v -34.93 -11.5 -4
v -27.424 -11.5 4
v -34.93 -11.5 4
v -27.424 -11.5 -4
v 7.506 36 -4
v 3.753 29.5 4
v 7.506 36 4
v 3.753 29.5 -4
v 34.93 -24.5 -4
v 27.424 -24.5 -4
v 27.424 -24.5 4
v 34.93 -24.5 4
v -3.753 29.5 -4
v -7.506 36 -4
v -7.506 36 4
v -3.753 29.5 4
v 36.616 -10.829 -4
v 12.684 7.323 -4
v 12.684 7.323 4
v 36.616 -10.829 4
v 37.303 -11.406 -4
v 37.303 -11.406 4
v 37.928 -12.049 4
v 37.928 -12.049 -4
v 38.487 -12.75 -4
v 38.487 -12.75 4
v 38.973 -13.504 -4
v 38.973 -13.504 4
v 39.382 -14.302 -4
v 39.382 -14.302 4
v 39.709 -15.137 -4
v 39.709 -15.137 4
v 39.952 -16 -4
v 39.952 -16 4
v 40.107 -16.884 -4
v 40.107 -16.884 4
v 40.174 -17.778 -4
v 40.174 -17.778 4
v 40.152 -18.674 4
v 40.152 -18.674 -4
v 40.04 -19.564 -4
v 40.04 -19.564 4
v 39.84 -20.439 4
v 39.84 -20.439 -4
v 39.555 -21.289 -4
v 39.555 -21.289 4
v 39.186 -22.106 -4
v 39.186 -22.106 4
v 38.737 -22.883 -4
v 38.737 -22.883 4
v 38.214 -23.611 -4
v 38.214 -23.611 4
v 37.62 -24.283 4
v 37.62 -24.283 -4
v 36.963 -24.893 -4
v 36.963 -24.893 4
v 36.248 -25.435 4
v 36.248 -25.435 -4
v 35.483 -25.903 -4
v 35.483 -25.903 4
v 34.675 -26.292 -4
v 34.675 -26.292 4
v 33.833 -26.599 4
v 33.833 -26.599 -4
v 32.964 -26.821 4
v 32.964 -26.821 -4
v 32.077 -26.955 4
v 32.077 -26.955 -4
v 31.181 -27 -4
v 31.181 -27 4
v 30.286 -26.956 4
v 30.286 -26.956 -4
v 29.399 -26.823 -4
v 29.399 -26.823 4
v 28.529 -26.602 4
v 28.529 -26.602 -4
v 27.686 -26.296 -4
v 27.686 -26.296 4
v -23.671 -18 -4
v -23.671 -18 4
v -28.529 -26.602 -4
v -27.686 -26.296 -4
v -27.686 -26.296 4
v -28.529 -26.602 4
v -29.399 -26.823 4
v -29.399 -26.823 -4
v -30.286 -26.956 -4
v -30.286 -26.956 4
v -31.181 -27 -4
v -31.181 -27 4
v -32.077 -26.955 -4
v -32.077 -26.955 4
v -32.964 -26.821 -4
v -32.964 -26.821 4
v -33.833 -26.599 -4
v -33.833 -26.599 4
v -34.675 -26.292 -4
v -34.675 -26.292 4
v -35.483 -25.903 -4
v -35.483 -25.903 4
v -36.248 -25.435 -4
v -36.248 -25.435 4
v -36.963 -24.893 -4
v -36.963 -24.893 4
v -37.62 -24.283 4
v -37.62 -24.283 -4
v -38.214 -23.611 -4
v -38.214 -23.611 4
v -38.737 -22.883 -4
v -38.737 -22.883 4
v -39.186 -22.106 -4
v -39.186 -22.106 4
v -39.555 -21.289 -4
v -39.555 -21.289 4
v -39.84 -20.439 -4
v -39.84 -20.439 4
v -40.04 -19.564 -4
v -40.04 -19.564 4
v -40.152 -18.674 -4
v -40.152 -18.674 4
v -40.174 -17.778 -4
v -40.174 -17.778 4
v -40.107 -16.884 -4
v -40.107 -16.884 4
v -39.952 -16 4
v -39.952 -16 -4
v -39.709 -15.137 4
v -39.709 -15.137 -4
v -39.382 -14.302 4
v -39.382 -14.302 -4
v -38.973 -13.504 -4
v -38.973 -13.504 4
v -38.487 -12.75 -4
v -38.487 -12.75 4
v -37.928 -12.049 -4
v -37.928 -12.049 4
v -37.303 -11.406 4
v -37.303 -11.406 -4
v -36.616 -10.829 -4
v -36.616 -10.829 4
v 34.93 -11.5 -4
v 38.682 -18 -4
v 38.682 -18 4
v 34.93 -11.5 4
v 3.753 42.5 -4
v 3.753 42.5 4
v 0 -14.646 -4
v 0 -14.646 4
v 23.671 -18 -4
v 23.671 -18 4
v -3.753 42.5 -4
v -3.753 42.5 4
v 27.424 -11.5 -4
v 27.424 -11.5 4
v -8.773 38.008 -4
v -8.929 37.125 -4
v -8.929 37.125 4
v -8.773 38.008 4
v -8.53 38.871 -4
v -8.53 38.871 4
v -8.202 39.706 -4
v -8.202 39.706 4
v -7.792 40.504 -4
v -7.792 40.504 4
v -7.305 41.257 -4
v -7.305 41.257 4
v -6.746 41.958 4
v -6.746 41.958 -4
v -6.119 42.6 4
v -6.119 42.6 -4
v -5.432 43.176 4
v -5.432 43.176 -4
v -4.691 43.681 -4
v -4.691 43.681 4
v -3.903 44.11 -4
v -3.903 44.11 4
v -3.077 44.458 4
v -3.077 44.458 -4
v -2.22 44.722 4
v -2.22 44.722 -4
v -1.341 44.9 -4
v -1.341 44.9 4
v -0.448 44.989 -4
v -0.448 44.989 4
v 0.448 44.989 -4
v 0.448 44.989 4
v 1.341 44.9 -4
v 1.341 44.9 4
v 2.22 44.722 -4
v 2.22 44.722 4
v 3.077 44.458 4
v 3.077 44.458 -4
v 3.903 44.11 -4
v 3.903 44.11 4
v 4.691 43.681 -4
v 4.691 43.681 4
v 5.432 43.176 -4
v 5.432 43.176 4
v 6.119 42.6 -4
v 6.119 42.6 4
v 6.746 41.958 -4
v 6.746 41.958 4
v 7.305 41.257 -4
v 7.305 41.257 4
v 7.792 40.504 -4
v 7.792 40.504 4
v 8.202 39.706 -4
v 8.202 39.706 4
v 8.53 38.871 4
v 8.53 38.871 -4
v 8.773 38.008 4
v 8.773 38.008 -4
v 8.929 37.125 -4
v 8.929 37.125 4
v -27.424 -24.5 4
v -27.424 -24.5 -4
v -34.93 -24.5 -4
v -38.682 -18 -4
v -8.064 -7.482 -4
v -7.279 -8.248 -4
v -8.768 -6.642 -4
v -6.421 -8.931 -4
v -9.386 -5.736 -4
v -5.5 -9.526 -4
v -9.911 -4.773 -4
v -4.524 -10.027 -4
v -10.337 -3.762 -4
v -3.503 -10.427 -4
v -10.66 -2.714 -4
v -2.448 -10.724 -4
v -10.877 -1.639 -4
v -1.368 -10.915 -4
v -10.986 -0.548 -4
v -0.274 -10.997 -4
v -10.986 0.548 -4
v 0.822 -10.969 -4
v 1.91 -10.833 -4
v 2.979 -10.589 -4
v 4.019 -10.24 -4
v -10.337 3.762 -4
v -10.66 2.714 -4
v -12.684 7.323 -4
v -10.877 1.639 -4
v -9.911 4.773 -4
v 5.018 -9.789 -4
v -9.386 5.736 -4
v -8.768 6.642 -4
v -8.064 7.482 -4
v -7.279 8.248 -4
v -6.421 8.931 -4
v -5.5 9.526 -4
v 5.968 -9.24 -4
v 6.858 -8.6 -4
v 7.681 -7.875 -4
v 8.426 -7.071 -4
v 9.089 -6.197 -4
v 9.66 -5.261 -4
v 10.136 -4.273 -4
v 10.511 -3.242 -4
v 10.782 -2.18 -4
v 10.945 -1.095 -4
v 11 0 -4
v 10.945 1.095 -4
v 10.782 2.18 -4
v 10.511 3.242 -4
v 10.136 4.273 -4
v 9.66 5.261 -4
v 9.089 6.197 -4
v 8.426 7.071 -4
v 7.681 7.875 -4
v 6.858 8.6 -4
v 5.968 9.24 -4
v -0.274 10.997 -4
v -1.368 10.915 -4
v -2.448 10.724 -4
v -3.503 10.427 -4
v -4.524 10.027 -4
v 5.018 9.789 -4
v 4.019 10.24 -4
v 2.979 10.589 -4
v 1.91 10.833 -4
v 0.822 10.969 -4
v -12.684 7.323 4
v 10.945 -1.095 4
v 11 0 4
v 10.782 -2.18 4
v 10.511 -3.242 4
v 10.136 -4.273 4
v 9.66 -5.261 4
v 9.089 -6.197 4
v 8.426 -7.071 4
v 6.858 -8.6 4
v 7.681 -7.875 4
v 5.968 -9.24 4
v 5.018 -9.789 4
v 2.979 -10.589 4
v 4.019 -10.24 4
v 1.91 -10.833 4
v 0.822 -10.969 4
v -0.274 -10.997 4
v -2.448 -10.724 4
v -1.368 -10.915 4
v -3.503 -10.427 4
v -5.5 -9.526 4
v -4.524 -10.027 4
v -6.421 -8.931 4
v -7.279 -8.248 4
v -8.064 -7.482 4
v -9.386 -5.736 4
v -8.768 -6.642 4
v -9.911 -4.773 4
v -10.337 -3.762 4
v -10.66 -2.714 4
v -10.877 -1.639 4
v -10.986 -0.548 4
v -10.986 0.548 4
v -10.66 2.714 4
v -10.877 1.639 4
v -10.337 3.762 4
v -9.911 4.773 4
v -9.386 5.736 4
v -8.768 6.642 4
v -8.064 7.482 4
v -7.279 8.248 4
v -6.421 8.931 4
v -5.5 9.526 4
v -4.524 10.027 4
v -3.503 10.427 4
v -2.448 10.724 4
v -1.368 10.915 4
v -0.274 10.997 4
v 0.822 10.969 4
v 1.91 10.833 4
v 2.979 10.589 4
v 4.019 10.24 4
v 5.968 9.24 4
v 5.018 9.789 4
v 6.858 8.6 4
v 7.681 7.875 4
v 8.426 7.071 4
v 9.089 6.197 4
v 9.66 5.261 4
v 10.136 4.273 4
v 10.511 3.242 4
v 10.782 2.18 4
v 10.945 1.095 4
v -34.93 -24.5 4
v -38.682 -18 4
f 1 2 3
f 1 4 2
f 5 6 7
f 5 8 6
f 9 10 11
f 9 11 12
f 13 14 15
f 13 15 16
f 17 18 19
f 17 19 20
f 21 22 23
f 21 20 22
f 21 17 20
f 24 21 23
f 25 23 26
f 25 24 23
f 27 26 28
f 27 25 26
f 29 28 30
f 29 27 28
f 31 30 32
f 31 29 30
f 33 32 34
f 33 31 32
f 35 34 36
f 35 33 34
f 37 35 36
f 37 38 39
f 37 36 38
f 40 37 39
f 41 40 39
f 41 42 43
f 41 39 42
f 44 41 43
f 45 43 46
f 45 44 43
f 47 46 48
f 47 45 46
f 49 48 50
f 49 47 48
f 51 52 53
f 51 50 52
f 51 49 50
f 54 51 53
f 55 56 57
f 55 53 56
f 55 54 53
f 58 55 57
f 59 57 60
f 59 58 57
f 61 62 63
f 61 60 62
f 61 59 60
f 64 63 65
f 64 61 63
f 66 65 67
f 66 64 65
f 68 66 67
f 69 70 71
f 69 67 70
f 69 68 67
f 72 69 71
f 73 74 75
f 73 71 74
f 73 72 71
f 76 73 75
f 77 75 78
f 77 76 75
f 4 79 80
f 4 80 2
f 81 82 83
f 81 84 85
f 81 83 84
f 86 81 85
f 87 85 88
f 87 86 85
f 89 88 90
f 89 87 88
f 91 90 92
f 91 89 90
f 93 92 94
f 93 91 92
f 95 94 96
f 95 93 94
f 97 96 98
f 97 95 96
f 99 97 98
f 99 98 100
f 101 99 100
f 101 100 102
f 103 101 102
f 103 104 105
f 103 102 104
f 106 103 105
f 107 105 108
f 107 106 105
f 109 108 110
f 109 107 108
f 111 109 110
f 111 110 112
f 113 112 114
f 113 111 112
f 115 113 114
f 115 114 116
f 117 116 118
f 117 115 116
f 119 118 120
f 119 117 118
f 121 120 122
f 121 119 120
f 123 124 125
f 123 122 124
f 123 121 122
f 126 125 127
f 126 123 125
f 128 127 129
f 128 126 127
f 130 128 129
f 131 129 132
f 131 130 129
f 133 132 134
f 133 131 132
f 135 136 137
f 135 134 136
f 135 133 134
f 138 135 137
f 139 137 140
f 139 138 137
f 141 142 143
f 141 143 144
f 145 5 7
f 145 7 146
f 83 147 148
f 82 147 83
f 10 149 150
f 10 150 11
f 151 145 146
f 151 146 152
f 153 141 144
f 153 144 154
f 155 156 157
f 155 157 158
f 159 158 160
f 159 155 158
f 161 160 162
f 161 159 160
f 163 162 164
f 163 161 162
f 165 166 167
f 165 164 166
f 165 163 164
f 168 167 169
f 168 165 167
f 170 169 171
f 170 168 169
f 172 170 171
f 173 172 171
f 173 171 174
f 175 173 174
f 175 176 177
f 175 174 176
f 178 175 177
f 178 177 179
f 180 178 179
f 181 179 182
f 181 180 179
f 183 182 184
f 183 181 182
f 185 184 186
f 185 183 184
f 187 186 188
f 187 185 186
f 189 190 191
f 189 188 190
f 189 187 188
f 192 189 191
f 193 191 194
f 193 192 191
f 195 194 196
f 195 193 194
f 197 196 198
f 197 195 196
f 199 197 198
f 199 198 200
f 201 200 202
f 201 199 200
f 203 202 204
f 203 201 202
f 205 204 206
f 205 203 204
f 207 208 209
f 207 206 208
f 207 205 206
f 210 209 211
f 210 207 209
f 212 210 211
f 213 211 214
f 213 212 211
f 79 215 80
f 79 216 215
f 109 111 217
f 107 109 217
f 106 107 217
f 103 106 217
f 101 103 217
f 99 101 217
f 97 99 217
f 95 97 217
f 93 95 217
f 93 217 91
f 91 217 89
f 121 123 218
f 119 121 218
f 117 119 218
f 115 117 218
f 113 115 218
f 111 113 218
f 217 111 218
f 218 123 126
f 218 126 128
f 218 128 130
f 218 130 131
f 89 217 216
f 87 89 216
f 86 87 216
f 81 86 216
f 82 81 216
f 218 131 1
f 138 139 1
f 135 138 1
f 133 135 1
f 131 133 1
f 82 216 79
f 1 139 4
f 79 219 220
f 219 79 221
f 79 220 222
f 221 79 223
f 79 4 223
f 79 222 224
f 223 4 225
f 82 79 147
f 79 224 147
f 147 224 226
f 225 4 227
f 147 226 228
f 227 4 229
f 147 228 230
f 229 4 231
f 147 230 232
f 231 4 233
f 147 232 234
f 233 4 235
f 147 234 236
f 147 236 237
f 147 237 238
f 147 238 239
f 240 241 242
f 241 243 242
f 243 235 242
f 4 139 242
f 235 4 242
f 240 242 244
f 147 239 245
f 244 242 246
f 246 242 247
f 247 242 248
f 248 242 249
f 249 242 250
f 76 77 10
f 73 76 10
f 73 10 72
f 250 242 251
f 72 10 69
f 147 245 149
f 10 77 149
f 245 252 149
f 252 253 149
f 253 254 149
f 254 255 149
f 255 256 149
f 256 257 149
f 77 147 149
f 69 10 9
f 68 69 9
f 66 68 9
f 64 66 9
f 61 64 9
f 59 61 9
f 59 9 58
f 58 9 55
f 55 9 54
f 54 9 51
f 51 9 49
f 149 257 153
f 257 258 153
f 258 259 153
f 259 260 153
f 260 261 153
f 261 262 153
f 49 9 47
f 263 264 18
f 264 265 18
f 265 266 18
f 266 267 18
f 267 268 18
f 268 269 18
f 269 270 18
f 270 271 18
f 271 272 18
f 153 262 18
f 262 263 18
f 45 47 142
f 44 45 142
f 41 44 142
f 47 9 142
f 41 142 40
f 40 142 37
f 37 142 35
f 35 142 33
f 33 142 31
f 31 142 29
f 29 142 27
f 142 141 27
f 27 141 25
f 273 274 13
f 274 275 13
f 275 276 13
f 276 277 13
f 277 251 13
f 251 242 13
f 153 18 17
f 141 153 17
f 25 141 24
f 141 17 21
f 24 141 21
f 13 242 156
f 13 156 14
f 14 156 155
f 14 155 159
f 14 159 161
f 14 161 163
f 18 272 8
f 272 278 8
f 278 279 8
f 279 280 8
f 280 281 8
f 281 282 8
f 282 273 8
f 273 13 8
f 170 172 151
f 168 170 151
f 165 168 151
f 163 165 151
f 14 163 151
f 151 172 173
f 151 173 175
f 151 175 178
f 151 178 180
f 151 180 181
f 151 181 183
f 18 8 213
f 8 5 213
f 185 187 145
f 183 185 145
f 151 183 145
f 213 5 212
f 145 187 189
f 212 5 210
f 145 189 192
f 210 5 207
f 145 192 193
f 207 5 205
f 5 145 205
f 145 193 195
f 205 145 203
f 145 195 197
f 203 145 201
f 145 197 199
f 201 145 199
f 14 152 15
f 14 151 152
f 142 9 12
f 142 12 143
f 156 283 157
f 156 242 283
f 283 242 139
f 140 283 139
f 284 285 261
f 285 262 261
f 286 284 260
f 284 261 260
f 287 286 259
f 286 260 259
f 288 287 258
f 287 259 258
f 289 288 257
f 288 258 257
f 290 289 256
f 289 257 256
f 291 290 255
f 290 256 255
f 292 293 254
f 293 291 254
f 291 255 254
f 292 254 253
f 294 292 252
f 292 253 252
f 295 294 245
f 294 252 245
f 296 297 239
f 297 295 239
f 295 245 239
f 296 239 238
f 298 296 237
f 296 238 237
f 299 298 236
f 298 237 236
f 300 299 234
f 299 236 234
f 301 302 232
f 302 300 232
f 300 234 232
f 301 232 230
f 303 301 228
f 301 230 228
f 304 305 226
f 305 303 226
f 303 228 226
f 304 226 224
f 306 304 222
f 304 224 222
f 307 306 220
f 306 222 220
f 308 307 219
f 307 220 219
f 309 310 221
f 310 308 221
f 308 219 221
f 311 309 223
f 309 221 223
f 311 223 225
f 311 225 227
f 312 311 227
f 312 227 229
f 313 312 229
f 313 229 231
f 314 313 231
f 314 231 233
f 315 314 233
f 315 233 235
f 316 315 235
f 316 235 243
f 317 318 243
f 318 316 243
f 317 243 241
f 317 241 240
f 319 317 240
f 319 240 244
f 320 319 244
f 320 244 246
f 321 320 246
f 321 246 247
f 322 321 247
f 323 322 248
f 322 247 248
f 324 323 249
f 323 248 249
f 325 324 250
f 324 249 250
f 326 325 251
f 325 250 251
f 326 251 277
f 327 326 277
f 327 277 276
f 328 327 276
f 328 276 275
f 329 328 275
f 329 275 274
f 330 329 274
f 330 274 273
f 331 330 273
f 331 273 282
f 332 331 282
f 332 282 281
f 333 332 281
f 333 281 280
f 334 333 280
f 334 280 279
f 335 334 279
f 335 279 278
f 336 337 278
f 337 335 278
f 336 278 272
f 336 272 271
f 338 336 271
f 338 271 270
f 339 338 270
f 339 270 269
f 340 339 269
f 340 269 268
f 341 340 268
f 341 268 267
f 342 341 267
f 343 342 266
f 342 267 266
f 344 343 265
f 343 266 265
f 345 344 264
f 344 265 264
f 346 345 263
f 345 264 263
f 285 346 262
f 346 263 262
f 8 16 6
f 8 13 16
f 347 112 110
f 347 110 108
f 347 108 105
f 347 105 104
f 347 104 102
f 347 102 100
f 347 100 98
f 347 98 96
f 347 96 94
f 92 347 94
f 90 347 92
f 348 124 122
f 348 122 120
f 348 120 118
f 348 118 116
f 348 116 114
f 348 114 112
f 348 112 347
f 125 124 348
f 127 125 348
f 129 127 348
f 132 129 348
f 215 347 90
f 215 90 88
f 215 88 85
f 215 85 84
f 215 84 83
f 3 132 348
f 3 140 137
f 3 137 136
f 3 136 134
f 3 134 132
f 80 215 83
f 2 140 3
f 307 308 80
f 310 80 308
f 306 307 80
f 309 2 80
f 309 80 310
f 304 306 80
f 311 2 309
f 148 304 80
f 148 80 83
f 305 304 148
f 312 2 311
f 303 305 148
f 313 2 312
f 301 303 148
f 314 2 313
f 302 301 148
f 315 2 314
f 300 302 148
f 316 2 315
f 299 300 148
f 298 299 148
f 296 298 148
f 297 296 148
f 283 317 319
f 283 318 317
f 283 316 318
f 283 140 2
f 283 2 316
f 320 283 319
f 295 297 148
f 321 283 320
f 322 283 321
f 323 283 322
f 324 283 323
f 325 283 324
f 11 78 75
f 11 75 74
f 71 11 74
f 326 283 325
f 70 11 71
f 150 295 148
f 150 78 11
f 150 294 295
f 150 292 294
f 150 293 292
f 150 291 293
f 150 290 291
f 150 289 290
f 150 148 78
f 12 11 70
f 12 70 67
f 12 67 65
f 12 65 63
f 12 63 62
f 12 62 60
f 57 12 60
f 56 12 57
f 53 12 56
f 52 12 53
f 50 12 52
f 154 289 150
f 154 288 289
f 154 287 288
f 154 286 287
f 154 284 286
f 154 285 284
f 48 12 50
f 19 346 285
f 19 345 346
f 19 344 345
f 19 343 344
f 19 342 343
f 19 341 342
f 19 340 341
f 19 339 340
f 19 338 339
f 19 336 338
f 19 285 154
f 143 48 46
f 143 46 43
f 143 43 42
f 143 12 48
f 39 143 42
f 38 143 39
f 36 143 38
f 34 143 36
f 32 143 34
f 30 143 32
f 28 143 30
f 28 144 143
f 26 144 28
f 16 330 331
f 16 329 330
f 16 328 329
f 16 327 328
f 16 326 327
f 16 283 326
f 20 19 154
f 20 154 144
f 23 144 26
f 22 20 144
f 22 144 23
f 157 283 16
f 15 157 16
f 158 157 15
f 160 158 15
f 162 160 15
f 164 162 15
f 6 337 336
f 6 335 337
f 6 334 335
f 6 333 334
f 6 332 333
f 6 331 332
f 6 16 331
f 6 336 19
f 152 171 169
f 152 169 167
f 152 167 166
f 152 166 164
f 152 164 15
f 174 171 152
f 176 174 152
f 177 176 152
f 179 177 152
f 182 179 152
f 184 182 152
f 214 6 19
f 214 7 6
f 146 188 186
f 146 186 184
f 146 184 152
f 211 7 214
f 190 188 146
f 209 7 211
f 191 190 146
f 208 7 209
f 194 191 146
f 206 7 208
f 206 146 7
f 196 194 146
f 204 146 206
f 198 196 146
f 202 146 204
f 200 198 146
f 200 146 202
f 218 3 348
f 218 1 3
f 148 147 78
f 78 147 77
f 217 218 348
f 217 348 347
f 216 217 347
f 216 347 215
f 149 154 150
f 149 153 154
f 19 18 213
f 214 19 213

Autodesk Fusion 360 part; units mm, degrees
sketch "Sketch1" plane through (0, 0, 0) normal (0, 0, 1) x (1, 0, 0) in component "fidget spinner"
  circle A0 centre (0, 0) radius 4
  circle A1 centre (0, 0) radius 11
  circle A2 centre (0, 0) radius 13.5
  line L0 (-3.7528, 42.5) -> (-7.5056, 36)
  line L1 (-7.5056, 36) -> (-3.7528, 29.5)
  line L2 (-3.7528, 29.5) -> (3.7528, 29.5)
  line L3 (3.7528, 29.5) -> (7.5056, 36)
  line L4 (7.5056, 36) -> (3.7528, 42.5)
  line L5 (3.7528, 42.5) -> (-3.7528, 42.5)
  line L6 (-12.6841, 7.3232) -> (-8.9294, 37.125)
  line L7 (12.6841, 7.3232) -> (8.9294, 37.125)
  line L8 (-34.9297, -11.5) -> (-38.6825, -18)
  line L9 (-38.6825, -18) -> (-34.9297, -24.5)
  line L10 (-34.9297, -24.5) -> (-27.4241, -24.5)
  line L11 (-27.4241, -24.5) -> (-23.6714, -18)
  line L12 (-23.6714, -18) -> (-27.4241, -11.5)
  line L13 (-27.4241, -11.5) -> (-34.9297, -11.5)
  line L14 (0, -14.6463) -> (-27.6865, -26.2956)
  line L15 (-12.6841, 7.3232) -> (-36.6159, -10.8294)
  line L16 (27.4241, -24.5) -> (34.9297, -24.5)
  line L17 (34.9297, -24.5) -> (38.6825, -18)
  line L18 (38.6825, -18) -> (34.9297, -11.5)
  line L19 (34.9297, -11.5) -> (27.4241, -11.5)
  line L20 (27.4241, -11.5) -> (23.6714, -18)
  line L21 (23.6714, -18) -> (27.4241, -24.5)
  line L22 (12.6841, 7.3232) -> (36.6159, -10.8294)
  line L23 (0, -14.6463) -> (27.6865, -26.2956)
  arc A3 (8.9294, 37.125) -> (-8.9294, 37.125) centre (0, 36) ccw
  arc A4 (-36.6159, -10.8294) -> (-27.6865, -26.2956) centre (-31.1769, -18) ccw
  arc A5 (27.6865, -26.2956) -> (36.6159, -10.8294) centre (31.1769, -18) ccw
  point P0 (0, 36)
  dimension "d1" = 8
  dimension "d2" = 22
  dimension "d3" = 27
  dimension "d4" = 36
  dimension "d5" = 6.5
  dimension "d6" = 18
extrude "Extrude1" add sketch "Sketch1" along normal mid plane 8 contours A2 | L6 L7 L14 L15 L22 L23 A3 A4 A5 in component "fidget spinner"
component "fidget spinner" placed x (1, 0, 0) y (0, 1, 0) z (0, 0, 1) at (0, 0, 0)
